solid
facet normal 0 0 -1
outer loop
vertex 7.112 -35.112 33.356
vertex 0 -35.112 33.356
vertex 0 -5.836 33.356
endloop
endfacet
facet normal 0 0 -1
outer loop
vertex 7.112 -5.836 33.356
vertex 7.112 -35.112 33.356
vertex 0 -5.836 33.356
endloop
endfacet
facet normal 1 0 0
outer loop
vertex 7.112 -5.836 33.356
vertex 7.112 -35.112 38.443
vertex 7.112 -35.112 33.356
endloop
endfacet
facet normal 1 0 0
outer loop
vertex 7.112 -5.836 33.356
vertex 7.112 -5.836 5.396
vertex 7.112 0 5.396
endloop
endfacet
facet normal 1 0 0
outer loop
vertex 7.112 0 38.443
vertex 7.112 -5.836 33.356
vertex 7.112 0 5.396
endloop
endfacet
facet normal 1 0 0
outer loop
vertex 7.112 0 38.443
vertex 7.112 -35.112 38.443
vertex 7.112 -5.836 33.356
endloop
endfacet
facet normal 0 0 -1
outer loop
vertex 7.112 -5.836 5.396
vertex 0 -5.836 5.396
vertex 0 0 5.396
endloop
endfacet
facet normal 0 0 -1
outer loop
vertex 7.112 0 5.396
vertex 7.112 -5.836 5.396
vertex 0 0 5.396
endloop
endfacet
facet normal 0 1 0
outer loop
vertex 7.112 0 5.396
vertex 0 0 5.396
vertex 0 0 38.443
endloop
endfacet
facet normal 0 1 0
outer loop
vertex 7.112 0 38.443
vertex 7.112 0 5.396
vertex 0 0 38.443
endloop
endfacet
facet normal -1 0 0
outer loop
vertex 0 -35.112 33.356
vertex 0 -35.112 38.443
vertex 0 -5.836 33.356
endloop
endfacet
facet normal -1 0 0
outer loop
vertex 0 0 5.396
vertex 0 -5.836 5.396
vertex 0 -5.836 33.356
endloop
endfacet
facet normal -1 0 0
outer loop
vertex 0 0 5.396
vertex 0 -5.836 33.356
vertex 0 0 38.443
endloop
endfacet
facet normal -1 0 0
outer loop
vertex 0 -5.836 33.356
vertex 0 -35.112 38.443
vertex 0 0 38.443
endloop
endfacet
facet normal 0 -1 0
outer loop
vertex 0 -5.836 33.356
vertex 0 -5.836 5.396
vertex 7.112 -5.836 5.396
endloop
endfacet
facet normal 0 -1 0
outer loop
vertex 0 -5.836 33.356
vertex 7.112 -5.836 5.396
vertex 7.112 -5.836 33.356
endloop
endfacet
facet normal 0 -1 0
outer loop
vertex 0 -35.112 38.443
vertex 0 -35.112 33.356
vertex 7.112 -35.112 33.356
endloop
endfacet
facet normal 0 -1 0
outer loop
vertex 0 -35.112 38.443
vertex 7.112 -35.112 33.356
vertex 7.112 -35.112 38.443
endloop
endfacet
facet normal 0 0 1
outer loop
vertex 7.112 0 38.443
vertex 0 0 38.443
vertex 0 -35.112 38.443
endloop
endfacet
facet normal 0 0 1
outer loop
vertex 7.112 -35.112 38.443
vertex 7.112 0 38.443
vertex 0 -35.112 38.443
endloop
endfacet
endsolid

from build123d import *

# Parameters (mm, degrees)
F0_W     = 29.2758359574
F0_H     = 5.0876662135
F0_W_2   = 5.8360383846
F0_H_2   = 27.9592750594
F1_DEPTH = 7.112


with BuildPart() as f1:
    # F0 (on Right) → F1 (new body)
    with BuildSketch(Plane.YZ):
        with Locations((-20.4739563633, 35.8995459974)):
            Rectangle(F0_W, F0_H)
        with Locations((-2.9180191923, 35.8995459974)):
            Rectangle(F0_W_2, F0_H)
        with Locations((-2.9180191923, 19.3760753609)):
            Rectangle(F0_W_2, F0_H_2)
    extrude(amount=F1_DEPTH)


solid = f1.part
